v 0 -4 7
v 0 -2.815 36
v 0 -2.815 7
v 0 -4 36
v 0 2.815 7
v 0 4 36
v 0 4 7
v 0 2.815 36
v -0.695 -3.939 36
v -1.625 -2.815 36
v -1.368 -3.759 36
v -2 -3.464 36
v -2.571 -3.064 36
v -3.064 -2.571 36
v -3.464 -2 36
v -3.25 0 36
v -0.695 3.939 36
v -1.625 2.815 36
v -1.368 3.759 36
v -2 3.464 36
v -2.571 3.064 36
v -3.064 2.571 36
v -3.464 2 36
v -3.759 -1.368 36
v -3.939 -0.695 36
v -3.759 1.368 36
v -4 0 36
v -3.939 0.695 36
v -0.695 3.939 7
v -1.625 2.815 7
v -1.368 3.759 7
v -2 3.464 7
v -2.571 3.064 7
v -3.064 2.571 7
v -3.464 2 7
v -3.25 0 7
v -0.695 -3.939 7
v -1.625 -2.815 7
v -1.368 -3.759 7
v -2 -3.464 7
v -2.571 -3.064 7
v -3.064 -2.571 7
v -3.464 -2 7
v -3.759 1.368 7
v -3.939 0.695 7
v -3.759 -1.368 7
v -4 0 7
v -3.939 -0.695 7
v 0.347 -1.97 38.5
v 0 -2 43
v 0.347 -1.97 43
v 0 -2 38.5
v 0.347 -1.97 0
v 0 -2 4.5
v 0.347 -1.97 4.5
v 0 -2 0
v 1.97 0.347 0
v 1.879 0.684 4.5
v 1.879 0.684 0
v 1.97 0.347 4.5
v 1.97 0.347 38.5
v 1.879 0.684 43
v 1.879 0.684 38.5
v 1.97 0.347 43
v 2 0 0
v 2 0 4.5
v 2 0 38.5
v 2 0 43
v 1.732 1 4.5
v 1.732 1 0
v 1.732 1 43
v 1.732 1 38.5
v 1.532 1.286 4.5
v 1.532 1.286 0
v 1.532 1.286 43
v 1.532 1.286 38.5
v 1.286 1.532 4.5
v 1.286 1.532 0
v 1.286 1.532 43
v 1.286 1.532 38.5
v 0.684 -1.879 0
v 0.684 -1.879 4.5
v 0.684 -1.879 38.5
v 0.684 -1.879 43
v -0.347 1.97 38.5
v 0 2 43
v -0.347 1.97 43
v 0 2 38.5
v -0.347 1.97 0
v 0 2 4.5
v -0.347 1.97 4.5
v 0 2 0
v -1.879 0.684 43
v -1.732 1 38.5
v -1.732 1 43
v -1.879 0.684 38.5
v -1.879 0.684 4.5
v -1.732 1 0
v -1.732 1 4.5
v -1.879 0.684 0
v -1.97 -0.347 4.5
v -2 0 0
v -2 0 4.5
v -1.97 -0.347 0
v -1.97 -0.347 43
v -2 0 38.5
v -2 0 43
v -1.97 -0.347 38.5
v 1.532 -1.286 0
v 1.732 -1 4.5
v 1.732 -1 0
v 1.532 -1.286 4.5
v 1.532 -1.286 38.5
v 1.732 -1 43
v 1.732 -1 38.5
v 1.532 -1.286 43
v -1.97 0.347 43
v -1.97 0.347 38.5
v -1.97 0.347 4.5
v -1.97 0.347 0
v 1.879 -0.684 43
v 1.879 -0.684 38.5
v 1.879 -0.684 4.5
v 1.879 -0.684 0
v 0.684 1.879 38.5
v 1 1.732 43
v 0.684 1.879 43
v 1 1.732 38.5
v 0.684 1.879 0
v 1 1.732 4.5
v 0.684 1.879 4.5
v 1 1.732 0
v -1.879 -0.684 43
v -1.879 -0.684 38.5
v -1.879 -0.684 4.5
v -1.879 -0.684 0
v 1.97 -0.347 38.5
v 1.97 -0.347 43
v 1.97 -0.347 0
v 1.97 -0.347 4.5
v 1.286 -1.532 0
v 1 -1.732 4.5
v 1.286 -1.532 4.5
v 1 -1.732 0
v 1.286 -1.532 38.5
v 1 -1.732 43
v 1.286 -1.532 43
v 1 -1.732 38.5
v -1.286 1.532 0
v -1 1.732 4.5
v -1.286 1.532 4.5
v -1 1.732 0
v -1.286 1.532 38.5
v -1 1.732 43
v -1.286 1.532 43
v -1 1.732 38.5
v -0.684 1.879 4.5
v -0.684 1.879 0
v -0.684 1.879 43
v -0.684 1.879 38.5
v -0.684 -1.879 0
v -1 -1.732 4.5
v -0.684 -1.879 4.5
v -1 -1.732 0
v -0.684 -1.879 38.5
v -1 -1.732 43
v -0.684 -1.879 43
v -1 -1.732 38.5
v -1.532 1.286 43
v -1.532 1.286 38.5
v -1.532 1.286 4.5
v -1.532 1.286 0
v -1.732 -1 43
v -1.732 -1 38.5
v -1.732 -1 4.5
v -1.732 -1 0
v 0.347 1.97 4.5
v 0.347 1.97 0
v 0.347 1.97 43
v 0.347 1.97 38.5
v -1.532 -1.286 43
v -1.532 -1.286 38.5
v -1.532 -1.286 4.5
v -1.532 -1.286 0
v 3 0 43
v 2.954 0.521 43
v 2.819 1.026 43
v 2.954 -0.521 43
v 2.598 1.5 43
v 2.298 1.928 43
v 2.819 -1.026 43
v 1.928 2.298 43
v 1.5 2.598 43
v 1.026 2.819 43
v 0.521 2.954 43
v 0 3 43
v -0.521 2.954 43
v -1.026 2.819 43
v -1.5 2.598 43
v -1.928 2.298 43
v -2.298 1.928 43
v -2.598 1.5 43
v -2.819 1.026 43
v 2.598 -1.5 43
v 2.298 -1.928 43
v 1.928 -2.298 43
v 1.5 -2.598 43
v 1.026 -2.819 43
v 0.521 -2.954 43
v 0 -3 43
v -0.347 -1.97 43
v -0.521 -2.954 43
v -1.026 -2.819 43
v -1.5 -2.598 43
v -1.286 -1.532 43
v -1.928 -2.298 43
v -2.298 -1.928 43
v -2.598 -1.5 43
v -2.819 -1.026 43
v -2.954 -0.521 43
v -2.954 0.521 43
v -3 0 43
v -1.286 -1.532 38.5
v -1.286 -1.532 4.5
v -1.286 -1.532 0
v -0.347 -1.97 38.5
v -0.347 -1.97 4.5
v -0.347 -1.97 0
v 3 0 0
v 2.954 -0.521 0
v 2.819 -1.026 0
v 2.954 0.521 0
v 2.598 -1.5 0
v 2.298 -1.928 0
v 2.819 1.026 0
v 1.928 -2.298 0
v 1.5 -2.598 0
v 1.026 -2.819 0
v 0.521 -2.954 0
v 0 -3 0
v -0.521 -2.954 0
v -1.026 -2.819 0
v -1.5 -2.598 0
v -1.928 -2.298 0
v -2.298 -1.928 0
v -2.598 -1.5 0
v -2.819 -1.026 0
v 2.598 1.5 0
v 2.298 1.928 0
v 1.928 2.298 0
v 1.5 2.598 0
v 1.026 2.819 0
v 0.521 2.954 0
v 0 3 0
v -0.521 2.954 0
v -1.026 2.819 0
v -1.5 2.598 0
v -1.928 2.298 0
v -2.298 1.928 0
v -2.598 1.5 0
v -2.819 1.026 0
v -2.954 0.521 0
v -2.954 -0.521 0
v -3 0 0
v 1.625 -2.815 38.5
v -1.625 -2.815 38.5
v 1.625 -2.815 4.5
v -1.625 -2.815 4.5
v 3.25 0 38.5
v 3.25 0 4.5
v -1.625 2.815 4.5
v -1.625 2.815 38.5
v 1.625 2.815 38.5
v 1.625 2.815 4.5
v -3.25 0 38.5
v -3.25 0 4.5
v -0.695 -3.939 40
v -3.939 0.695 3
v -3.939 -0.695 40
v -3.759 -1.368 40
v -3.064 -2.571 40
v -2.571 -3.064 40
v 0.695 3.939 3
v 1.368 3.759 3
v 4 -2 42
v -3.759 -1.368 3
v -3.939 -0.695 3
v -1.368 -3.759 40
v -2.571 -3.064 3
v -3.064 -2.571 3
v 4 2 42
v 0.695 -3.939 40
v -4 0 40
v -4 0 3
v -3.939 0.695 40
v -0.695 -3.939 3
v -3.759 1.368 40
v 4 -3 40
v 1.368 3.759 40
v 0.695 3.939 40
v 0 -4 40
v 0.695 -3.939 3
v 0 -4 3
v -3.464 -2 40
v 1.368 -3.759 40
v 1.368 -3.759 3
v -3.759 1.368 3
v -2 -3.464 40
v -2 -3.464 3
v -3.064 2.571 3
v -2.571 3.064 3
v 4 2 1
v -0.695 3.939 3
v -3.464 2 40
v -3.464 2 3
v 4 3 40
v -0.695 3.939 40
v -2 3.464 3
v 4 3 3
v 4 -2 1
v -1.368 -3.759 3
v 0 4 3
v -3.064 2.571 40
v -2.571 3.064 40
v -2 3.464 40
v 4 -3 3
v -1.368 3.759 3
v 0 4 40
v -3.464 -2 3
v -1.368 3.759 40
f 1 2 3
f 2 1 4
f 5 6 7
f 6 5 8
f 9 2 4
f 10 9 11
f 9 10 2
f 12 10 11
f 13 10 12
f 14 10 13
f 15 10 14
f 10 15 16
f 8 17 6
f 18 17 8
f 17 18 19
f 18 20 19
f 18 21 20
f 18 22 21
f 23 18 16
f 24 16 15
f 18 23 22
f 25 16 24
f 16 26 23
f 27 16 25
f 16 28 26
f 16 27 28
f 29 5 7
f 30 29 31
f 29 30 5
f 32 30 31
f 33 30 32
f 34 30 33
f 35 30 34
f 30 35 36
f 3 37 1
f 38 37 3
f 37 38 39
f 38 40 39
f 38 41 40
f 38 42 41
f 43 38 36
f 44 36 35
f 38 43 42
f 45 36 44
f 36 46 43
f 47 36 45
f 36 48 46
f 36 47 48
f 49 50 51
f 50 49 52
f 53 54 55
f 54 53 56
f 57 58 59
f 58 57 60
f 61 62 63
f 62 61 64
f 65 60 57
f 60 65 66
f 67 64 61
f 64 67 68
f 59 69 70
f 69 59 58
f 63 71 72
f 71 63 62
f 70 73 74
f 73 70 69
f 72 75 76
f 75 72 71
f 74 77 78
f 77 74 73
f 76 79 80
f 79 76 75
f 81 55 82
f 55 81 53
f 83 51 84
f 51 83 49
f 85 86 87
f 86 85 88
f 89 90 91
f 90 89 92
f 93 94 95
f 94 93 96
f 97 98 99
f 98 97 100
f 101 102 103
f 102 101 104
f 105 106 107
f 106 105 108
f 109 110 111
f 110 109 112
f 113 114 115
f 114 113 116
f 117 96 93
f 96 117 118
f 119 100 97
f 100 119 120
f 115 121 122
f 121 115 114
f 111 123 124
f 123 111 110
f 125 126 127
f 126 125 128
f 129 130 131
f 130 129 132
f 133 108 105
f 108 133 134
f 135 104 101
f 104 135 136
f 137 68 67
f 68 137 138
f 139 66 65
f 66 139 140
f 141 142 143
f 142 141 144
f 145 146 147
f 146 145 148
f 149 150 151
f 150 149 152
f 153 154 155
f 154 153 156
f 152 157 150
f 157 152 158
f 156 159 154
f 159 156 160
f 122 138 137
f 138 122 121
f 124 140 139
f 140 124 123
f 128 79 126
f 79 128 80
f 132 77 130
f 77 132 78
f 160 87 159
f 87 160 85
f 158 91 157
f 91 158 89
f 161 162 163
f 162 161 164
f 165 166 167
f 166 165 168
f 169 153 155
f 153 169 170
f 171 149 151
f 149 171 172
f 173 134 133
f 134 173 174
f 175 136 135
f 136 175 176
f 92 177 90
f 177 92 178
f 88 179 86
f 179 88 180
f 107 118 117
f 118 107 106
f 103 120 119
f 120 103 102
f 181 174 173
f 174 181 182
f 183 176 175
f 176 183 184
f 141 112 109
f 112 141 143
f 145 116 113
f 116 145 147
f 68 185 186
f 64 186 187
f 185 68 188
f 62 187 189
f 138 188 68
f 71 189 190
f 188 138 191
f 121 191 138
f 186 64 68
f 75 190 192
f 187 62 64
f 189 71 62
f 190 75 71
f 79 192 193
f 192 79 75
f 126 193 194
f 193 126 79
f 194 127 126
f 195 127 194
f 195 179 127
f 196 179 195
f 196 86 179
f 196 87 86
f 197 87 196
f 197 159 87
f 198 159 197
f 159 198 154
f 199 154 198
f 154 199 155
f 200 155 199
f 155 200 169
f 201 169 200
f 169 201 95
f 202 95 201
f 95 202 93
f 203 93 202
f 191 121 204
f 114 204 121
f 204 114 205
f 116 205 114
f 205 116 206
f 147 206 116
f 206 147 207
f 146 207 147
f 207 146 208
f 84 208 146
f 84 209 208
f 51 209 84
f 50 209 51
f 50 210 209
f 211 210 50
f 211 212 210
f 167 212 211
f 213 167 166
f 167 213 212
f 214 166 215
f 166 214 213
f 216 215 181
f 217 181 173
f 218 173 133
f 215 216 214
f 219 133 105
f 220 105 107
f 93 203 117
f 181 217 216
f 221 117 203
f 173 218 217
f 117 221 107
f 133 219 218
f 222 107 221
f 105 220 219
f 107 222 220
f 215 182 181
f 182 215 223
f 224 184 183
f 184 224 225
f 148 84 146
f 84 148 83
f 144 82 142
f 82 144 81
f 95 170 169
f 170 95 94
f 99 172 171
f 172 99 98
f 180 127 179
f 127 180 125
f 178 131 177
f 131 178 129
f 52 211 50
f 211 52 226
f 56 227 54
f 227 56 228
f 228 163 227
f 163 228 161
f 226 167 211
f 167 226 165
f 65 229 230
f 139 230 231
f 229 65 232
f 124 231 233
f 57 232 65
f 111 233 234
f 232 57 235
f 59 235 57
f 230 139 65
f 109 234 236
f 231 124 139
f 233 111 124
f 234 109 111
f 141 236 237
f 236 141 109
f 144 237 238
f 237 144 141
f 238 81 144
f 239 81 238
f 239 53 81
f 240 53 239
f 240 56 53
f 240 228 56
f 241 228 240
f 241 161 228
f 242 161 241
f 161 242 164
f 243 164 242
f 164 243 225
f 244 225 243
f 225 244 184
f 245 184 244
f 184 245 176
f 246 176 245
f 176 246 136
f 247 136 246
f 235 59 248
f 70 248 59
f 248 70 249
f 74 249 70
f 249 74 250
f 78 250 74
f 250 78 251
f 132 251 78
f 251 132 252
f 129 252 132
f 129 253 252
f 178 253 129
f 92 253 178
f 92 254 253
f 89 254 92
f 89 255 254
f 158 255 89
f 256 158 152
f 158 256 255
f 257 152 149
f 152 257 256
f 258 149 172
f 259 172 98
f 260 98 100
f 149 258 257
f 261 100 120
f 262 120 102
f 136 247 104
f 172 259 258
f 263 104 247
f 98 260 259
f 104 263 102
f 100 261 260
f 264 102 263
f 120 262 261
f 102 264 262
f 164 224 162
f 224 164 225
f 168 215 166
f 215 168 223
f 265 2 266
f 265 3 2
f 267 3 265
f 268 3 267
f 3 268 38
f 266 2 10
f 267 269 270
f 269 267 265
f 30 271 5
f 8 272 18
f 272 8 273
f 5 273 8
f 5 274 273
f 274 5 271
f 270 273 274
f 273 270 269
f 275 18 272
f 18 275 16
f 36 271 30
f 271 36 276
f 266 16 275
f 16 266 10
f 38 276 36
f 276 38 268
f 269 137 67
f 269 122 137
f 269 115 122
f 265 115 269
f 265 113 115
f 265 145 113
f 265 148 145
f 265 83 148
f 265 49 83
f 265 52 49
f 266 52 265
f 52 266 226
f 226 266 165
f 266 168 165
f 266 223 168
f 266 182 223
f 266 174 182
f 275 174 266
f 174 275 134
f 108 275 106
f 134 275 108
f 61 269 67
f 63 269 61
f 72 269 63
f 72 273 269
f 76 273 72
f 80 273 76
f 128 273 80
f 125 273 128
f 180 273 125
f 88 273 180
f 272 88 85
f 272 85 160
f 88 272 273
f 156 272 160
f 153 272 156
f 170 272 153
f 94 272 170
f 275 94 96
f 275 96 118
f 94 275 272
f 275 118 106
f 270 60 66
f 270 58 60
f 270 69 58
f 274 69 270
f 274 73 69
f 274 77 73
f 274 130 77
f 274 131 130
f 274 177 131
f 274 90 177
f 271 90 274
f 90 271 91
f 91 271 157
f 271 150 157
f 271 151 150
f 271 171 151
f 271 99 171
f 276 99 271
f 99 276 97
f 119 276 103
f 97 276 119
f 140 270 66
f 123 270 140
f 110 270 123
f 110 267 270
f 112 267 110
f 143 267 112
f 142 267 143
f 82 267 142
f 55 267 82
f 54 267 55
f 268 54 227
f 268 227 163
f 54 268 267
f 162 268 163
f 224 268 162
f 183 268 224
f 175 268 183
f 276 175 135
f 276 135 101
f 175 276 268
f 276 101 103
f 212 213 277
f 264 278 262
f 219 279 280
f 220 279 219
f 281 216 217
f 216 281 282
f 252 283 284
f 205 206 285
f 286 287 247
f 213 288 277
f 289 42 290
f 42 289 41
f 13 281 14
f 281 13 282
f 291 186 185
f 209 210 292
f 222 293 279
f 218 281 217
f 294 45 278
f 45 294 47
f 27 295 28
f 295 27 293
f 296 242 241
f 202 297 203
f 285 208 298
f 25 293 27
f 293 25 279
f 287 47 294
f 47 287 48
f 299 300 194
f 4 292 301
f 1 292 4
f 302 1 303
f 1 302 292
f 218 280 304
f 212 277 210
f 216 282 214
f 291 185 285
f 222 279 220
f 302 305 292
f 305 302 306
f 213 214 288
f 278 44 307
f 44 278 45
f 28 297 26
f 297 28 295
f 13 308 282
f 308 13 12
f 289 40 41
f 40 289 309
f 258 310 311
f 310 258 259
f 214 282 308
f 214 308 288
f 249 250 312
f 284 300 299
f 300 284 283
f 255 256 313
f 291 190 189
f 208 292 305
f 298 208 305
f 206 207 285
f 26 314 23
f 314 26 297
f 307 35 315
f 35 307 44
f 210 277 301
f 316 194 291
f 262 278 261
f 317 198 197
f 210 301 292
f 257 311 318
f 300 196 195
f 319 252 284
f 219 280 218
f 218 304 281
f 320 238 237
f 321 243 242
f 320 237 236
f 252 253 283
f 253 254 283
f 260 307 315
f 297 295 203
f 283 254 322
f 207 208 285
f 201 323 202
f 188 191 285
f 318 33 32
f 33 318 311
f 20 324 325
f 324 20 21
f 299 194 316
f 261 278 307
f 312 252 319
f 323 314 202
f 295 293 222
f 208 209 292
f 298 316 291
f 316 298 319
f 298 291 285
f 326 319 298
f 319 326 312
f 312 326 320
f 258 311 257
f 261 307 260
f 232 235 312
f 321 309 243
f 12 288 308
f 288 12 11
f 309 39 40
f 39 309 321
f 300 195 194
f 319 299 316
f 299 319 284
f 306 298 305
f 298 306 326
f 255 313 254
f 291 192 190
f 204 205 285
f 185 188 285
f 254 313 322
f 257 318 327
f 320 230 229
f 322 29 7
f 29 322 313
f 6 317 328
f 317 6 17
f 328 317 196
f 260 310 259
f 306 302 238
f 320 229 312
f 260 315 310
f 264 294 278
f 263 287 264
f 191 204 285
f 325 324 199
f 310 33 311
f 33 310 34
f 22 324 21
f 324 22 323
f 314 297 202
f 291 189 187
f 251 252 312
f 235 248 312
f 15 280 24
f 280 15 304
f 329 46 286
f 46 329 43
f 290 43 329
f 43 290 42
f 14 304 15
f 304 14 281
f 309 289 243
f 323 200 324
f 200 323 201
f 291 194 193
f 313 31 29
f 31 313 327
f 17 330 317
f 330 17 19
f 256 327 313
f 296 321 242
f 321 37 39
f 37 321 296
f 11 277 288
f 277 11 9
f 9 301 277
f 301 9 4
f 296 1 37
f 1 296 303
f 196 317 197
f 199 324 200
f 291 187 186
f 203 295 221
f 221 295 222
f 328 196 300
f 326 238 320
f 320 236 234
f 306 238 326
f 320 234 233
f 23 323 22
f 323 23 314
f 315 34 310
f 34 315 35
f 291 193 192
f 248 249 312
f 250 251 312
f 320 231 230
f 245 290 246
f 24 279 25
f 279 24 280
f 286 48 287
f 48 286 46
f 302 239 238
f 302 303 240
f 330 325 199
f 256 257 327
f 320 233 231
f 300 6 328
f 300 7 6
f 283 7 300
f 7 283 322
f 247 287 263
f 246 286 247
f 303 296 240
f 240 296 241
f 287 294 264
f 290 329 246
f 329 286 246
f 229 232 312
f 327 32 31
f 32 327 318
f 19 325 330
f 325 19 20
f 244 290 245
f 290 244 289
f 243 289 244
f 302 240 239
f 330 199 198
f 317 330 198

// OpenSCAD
$fn = 36; 

module base() {

hull() {

 cylinder(h=3, d1=6, d2=8, center=false);
 
 
 
translate([0,0,40])
 
cylinder(h=3, d1=8, d2=6, center=false);
    
translate([3,-3,3])
 
cube ([1,6,43-3-3]);  
  
translate([3,-2,1])
  
cube ([1,4,41]);      
    
}

}


module holes() {

translate([-10,-5,3+8/2])
cube ([10,10,43-3-3-8]);   

cylinder(h=43, d=4, center=false);


translate([0,0,4.5])
cylinder(h = 43-3-3-8+5, d = 6.5, center = false, $fn = 6 );


}

difference (){
base();

holes();
    
}
